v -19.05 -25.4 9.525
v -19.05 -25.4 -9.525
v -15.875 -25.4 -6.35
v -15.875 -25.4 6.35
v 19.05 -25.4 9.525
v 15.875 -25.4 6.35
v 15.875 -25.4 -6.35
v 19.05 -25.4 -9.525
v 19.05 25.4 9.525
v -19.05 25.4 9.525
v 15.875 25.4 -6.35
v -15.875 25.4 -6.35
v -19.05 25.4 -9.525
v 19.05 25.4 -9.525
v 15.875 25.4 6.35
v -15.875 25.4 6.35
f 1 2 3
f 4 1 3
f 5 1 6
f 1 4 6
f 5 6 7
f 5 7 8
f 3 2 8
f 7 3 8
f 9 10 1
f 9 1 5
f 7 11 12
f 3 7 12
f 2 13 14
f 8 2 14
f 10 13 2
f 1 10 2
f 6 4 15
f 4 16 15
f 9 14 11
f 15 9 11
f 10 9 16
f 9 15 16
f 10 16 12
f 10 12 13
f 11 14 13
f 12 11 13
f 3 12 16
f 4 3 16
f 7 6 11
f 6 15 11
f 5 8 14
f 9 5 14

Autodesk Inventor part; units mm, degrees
ref_plane "XZ Plane" through (0, 0, 0) normal (0, 1, 0) x (-1, 0, 0)
ref_plane "XY Plane" through (0, 0, 0) normal (0, 0, 1) x (1, 0, 0)
sketch "Sketch1" plane through (0, 0, 0) normal (0, 0, 1) x (1, 0, 0)
  line L0 (-19.05, -25.4) -> (19.05, -25.4)
  line L1 (19.05, -25.4) -> (19.05, 25.4)
  line L2 (19.05, 25.4) -> (-19.05, 25.4)
  line L3 (-19.05, 25.4) -> (-19.05, -25.4)
  line L4 (-19.05, -25.4) -> (19.05, 25.4) construction
  line L5 (19.05, -25.4) -> (-19.05, 25.4) construction
  point P0 (0, 0)
  dimension "d0" = 38.1
  dimension "d1" = 50.8
extrude "Extrusion1" add sketch "Sketch1" along normal mid plane 19.05
sketch "Sketch2" plane through (-19.05, 25.4, 9.525) normal (0, 1, 0) x (1, 0, 0)
  line L0 (34.925, 3.175) -> (34.925, 15.875)
  line L1 (34.925, 15.875) -> (3.175, 15.875)
  line L2 (3.175, 15.875) -> (3.175, 3.175)
  line L3 (3.175, 3.175) -> (34.925, 3.175)
  line L4 (34.925, 3.175) -> (3.175, 15.875) construction
  line L5 (34.925, 15.875) -> (3.175, 3.175) construction
  line L6 (0, 19.05) -> (38.1, 19.05) projected
  line L7 (0, 19.05) -> (0, 0) projected
  point P0 (19.05, 9.525)
  dimension "d4" = 3.175
  dimension "d5" = 3.175
extrude "Extrusion2" cut sketch "Sketch2" against normal through all
properties part number "magnetHolder" material "Aluminum 6061"
